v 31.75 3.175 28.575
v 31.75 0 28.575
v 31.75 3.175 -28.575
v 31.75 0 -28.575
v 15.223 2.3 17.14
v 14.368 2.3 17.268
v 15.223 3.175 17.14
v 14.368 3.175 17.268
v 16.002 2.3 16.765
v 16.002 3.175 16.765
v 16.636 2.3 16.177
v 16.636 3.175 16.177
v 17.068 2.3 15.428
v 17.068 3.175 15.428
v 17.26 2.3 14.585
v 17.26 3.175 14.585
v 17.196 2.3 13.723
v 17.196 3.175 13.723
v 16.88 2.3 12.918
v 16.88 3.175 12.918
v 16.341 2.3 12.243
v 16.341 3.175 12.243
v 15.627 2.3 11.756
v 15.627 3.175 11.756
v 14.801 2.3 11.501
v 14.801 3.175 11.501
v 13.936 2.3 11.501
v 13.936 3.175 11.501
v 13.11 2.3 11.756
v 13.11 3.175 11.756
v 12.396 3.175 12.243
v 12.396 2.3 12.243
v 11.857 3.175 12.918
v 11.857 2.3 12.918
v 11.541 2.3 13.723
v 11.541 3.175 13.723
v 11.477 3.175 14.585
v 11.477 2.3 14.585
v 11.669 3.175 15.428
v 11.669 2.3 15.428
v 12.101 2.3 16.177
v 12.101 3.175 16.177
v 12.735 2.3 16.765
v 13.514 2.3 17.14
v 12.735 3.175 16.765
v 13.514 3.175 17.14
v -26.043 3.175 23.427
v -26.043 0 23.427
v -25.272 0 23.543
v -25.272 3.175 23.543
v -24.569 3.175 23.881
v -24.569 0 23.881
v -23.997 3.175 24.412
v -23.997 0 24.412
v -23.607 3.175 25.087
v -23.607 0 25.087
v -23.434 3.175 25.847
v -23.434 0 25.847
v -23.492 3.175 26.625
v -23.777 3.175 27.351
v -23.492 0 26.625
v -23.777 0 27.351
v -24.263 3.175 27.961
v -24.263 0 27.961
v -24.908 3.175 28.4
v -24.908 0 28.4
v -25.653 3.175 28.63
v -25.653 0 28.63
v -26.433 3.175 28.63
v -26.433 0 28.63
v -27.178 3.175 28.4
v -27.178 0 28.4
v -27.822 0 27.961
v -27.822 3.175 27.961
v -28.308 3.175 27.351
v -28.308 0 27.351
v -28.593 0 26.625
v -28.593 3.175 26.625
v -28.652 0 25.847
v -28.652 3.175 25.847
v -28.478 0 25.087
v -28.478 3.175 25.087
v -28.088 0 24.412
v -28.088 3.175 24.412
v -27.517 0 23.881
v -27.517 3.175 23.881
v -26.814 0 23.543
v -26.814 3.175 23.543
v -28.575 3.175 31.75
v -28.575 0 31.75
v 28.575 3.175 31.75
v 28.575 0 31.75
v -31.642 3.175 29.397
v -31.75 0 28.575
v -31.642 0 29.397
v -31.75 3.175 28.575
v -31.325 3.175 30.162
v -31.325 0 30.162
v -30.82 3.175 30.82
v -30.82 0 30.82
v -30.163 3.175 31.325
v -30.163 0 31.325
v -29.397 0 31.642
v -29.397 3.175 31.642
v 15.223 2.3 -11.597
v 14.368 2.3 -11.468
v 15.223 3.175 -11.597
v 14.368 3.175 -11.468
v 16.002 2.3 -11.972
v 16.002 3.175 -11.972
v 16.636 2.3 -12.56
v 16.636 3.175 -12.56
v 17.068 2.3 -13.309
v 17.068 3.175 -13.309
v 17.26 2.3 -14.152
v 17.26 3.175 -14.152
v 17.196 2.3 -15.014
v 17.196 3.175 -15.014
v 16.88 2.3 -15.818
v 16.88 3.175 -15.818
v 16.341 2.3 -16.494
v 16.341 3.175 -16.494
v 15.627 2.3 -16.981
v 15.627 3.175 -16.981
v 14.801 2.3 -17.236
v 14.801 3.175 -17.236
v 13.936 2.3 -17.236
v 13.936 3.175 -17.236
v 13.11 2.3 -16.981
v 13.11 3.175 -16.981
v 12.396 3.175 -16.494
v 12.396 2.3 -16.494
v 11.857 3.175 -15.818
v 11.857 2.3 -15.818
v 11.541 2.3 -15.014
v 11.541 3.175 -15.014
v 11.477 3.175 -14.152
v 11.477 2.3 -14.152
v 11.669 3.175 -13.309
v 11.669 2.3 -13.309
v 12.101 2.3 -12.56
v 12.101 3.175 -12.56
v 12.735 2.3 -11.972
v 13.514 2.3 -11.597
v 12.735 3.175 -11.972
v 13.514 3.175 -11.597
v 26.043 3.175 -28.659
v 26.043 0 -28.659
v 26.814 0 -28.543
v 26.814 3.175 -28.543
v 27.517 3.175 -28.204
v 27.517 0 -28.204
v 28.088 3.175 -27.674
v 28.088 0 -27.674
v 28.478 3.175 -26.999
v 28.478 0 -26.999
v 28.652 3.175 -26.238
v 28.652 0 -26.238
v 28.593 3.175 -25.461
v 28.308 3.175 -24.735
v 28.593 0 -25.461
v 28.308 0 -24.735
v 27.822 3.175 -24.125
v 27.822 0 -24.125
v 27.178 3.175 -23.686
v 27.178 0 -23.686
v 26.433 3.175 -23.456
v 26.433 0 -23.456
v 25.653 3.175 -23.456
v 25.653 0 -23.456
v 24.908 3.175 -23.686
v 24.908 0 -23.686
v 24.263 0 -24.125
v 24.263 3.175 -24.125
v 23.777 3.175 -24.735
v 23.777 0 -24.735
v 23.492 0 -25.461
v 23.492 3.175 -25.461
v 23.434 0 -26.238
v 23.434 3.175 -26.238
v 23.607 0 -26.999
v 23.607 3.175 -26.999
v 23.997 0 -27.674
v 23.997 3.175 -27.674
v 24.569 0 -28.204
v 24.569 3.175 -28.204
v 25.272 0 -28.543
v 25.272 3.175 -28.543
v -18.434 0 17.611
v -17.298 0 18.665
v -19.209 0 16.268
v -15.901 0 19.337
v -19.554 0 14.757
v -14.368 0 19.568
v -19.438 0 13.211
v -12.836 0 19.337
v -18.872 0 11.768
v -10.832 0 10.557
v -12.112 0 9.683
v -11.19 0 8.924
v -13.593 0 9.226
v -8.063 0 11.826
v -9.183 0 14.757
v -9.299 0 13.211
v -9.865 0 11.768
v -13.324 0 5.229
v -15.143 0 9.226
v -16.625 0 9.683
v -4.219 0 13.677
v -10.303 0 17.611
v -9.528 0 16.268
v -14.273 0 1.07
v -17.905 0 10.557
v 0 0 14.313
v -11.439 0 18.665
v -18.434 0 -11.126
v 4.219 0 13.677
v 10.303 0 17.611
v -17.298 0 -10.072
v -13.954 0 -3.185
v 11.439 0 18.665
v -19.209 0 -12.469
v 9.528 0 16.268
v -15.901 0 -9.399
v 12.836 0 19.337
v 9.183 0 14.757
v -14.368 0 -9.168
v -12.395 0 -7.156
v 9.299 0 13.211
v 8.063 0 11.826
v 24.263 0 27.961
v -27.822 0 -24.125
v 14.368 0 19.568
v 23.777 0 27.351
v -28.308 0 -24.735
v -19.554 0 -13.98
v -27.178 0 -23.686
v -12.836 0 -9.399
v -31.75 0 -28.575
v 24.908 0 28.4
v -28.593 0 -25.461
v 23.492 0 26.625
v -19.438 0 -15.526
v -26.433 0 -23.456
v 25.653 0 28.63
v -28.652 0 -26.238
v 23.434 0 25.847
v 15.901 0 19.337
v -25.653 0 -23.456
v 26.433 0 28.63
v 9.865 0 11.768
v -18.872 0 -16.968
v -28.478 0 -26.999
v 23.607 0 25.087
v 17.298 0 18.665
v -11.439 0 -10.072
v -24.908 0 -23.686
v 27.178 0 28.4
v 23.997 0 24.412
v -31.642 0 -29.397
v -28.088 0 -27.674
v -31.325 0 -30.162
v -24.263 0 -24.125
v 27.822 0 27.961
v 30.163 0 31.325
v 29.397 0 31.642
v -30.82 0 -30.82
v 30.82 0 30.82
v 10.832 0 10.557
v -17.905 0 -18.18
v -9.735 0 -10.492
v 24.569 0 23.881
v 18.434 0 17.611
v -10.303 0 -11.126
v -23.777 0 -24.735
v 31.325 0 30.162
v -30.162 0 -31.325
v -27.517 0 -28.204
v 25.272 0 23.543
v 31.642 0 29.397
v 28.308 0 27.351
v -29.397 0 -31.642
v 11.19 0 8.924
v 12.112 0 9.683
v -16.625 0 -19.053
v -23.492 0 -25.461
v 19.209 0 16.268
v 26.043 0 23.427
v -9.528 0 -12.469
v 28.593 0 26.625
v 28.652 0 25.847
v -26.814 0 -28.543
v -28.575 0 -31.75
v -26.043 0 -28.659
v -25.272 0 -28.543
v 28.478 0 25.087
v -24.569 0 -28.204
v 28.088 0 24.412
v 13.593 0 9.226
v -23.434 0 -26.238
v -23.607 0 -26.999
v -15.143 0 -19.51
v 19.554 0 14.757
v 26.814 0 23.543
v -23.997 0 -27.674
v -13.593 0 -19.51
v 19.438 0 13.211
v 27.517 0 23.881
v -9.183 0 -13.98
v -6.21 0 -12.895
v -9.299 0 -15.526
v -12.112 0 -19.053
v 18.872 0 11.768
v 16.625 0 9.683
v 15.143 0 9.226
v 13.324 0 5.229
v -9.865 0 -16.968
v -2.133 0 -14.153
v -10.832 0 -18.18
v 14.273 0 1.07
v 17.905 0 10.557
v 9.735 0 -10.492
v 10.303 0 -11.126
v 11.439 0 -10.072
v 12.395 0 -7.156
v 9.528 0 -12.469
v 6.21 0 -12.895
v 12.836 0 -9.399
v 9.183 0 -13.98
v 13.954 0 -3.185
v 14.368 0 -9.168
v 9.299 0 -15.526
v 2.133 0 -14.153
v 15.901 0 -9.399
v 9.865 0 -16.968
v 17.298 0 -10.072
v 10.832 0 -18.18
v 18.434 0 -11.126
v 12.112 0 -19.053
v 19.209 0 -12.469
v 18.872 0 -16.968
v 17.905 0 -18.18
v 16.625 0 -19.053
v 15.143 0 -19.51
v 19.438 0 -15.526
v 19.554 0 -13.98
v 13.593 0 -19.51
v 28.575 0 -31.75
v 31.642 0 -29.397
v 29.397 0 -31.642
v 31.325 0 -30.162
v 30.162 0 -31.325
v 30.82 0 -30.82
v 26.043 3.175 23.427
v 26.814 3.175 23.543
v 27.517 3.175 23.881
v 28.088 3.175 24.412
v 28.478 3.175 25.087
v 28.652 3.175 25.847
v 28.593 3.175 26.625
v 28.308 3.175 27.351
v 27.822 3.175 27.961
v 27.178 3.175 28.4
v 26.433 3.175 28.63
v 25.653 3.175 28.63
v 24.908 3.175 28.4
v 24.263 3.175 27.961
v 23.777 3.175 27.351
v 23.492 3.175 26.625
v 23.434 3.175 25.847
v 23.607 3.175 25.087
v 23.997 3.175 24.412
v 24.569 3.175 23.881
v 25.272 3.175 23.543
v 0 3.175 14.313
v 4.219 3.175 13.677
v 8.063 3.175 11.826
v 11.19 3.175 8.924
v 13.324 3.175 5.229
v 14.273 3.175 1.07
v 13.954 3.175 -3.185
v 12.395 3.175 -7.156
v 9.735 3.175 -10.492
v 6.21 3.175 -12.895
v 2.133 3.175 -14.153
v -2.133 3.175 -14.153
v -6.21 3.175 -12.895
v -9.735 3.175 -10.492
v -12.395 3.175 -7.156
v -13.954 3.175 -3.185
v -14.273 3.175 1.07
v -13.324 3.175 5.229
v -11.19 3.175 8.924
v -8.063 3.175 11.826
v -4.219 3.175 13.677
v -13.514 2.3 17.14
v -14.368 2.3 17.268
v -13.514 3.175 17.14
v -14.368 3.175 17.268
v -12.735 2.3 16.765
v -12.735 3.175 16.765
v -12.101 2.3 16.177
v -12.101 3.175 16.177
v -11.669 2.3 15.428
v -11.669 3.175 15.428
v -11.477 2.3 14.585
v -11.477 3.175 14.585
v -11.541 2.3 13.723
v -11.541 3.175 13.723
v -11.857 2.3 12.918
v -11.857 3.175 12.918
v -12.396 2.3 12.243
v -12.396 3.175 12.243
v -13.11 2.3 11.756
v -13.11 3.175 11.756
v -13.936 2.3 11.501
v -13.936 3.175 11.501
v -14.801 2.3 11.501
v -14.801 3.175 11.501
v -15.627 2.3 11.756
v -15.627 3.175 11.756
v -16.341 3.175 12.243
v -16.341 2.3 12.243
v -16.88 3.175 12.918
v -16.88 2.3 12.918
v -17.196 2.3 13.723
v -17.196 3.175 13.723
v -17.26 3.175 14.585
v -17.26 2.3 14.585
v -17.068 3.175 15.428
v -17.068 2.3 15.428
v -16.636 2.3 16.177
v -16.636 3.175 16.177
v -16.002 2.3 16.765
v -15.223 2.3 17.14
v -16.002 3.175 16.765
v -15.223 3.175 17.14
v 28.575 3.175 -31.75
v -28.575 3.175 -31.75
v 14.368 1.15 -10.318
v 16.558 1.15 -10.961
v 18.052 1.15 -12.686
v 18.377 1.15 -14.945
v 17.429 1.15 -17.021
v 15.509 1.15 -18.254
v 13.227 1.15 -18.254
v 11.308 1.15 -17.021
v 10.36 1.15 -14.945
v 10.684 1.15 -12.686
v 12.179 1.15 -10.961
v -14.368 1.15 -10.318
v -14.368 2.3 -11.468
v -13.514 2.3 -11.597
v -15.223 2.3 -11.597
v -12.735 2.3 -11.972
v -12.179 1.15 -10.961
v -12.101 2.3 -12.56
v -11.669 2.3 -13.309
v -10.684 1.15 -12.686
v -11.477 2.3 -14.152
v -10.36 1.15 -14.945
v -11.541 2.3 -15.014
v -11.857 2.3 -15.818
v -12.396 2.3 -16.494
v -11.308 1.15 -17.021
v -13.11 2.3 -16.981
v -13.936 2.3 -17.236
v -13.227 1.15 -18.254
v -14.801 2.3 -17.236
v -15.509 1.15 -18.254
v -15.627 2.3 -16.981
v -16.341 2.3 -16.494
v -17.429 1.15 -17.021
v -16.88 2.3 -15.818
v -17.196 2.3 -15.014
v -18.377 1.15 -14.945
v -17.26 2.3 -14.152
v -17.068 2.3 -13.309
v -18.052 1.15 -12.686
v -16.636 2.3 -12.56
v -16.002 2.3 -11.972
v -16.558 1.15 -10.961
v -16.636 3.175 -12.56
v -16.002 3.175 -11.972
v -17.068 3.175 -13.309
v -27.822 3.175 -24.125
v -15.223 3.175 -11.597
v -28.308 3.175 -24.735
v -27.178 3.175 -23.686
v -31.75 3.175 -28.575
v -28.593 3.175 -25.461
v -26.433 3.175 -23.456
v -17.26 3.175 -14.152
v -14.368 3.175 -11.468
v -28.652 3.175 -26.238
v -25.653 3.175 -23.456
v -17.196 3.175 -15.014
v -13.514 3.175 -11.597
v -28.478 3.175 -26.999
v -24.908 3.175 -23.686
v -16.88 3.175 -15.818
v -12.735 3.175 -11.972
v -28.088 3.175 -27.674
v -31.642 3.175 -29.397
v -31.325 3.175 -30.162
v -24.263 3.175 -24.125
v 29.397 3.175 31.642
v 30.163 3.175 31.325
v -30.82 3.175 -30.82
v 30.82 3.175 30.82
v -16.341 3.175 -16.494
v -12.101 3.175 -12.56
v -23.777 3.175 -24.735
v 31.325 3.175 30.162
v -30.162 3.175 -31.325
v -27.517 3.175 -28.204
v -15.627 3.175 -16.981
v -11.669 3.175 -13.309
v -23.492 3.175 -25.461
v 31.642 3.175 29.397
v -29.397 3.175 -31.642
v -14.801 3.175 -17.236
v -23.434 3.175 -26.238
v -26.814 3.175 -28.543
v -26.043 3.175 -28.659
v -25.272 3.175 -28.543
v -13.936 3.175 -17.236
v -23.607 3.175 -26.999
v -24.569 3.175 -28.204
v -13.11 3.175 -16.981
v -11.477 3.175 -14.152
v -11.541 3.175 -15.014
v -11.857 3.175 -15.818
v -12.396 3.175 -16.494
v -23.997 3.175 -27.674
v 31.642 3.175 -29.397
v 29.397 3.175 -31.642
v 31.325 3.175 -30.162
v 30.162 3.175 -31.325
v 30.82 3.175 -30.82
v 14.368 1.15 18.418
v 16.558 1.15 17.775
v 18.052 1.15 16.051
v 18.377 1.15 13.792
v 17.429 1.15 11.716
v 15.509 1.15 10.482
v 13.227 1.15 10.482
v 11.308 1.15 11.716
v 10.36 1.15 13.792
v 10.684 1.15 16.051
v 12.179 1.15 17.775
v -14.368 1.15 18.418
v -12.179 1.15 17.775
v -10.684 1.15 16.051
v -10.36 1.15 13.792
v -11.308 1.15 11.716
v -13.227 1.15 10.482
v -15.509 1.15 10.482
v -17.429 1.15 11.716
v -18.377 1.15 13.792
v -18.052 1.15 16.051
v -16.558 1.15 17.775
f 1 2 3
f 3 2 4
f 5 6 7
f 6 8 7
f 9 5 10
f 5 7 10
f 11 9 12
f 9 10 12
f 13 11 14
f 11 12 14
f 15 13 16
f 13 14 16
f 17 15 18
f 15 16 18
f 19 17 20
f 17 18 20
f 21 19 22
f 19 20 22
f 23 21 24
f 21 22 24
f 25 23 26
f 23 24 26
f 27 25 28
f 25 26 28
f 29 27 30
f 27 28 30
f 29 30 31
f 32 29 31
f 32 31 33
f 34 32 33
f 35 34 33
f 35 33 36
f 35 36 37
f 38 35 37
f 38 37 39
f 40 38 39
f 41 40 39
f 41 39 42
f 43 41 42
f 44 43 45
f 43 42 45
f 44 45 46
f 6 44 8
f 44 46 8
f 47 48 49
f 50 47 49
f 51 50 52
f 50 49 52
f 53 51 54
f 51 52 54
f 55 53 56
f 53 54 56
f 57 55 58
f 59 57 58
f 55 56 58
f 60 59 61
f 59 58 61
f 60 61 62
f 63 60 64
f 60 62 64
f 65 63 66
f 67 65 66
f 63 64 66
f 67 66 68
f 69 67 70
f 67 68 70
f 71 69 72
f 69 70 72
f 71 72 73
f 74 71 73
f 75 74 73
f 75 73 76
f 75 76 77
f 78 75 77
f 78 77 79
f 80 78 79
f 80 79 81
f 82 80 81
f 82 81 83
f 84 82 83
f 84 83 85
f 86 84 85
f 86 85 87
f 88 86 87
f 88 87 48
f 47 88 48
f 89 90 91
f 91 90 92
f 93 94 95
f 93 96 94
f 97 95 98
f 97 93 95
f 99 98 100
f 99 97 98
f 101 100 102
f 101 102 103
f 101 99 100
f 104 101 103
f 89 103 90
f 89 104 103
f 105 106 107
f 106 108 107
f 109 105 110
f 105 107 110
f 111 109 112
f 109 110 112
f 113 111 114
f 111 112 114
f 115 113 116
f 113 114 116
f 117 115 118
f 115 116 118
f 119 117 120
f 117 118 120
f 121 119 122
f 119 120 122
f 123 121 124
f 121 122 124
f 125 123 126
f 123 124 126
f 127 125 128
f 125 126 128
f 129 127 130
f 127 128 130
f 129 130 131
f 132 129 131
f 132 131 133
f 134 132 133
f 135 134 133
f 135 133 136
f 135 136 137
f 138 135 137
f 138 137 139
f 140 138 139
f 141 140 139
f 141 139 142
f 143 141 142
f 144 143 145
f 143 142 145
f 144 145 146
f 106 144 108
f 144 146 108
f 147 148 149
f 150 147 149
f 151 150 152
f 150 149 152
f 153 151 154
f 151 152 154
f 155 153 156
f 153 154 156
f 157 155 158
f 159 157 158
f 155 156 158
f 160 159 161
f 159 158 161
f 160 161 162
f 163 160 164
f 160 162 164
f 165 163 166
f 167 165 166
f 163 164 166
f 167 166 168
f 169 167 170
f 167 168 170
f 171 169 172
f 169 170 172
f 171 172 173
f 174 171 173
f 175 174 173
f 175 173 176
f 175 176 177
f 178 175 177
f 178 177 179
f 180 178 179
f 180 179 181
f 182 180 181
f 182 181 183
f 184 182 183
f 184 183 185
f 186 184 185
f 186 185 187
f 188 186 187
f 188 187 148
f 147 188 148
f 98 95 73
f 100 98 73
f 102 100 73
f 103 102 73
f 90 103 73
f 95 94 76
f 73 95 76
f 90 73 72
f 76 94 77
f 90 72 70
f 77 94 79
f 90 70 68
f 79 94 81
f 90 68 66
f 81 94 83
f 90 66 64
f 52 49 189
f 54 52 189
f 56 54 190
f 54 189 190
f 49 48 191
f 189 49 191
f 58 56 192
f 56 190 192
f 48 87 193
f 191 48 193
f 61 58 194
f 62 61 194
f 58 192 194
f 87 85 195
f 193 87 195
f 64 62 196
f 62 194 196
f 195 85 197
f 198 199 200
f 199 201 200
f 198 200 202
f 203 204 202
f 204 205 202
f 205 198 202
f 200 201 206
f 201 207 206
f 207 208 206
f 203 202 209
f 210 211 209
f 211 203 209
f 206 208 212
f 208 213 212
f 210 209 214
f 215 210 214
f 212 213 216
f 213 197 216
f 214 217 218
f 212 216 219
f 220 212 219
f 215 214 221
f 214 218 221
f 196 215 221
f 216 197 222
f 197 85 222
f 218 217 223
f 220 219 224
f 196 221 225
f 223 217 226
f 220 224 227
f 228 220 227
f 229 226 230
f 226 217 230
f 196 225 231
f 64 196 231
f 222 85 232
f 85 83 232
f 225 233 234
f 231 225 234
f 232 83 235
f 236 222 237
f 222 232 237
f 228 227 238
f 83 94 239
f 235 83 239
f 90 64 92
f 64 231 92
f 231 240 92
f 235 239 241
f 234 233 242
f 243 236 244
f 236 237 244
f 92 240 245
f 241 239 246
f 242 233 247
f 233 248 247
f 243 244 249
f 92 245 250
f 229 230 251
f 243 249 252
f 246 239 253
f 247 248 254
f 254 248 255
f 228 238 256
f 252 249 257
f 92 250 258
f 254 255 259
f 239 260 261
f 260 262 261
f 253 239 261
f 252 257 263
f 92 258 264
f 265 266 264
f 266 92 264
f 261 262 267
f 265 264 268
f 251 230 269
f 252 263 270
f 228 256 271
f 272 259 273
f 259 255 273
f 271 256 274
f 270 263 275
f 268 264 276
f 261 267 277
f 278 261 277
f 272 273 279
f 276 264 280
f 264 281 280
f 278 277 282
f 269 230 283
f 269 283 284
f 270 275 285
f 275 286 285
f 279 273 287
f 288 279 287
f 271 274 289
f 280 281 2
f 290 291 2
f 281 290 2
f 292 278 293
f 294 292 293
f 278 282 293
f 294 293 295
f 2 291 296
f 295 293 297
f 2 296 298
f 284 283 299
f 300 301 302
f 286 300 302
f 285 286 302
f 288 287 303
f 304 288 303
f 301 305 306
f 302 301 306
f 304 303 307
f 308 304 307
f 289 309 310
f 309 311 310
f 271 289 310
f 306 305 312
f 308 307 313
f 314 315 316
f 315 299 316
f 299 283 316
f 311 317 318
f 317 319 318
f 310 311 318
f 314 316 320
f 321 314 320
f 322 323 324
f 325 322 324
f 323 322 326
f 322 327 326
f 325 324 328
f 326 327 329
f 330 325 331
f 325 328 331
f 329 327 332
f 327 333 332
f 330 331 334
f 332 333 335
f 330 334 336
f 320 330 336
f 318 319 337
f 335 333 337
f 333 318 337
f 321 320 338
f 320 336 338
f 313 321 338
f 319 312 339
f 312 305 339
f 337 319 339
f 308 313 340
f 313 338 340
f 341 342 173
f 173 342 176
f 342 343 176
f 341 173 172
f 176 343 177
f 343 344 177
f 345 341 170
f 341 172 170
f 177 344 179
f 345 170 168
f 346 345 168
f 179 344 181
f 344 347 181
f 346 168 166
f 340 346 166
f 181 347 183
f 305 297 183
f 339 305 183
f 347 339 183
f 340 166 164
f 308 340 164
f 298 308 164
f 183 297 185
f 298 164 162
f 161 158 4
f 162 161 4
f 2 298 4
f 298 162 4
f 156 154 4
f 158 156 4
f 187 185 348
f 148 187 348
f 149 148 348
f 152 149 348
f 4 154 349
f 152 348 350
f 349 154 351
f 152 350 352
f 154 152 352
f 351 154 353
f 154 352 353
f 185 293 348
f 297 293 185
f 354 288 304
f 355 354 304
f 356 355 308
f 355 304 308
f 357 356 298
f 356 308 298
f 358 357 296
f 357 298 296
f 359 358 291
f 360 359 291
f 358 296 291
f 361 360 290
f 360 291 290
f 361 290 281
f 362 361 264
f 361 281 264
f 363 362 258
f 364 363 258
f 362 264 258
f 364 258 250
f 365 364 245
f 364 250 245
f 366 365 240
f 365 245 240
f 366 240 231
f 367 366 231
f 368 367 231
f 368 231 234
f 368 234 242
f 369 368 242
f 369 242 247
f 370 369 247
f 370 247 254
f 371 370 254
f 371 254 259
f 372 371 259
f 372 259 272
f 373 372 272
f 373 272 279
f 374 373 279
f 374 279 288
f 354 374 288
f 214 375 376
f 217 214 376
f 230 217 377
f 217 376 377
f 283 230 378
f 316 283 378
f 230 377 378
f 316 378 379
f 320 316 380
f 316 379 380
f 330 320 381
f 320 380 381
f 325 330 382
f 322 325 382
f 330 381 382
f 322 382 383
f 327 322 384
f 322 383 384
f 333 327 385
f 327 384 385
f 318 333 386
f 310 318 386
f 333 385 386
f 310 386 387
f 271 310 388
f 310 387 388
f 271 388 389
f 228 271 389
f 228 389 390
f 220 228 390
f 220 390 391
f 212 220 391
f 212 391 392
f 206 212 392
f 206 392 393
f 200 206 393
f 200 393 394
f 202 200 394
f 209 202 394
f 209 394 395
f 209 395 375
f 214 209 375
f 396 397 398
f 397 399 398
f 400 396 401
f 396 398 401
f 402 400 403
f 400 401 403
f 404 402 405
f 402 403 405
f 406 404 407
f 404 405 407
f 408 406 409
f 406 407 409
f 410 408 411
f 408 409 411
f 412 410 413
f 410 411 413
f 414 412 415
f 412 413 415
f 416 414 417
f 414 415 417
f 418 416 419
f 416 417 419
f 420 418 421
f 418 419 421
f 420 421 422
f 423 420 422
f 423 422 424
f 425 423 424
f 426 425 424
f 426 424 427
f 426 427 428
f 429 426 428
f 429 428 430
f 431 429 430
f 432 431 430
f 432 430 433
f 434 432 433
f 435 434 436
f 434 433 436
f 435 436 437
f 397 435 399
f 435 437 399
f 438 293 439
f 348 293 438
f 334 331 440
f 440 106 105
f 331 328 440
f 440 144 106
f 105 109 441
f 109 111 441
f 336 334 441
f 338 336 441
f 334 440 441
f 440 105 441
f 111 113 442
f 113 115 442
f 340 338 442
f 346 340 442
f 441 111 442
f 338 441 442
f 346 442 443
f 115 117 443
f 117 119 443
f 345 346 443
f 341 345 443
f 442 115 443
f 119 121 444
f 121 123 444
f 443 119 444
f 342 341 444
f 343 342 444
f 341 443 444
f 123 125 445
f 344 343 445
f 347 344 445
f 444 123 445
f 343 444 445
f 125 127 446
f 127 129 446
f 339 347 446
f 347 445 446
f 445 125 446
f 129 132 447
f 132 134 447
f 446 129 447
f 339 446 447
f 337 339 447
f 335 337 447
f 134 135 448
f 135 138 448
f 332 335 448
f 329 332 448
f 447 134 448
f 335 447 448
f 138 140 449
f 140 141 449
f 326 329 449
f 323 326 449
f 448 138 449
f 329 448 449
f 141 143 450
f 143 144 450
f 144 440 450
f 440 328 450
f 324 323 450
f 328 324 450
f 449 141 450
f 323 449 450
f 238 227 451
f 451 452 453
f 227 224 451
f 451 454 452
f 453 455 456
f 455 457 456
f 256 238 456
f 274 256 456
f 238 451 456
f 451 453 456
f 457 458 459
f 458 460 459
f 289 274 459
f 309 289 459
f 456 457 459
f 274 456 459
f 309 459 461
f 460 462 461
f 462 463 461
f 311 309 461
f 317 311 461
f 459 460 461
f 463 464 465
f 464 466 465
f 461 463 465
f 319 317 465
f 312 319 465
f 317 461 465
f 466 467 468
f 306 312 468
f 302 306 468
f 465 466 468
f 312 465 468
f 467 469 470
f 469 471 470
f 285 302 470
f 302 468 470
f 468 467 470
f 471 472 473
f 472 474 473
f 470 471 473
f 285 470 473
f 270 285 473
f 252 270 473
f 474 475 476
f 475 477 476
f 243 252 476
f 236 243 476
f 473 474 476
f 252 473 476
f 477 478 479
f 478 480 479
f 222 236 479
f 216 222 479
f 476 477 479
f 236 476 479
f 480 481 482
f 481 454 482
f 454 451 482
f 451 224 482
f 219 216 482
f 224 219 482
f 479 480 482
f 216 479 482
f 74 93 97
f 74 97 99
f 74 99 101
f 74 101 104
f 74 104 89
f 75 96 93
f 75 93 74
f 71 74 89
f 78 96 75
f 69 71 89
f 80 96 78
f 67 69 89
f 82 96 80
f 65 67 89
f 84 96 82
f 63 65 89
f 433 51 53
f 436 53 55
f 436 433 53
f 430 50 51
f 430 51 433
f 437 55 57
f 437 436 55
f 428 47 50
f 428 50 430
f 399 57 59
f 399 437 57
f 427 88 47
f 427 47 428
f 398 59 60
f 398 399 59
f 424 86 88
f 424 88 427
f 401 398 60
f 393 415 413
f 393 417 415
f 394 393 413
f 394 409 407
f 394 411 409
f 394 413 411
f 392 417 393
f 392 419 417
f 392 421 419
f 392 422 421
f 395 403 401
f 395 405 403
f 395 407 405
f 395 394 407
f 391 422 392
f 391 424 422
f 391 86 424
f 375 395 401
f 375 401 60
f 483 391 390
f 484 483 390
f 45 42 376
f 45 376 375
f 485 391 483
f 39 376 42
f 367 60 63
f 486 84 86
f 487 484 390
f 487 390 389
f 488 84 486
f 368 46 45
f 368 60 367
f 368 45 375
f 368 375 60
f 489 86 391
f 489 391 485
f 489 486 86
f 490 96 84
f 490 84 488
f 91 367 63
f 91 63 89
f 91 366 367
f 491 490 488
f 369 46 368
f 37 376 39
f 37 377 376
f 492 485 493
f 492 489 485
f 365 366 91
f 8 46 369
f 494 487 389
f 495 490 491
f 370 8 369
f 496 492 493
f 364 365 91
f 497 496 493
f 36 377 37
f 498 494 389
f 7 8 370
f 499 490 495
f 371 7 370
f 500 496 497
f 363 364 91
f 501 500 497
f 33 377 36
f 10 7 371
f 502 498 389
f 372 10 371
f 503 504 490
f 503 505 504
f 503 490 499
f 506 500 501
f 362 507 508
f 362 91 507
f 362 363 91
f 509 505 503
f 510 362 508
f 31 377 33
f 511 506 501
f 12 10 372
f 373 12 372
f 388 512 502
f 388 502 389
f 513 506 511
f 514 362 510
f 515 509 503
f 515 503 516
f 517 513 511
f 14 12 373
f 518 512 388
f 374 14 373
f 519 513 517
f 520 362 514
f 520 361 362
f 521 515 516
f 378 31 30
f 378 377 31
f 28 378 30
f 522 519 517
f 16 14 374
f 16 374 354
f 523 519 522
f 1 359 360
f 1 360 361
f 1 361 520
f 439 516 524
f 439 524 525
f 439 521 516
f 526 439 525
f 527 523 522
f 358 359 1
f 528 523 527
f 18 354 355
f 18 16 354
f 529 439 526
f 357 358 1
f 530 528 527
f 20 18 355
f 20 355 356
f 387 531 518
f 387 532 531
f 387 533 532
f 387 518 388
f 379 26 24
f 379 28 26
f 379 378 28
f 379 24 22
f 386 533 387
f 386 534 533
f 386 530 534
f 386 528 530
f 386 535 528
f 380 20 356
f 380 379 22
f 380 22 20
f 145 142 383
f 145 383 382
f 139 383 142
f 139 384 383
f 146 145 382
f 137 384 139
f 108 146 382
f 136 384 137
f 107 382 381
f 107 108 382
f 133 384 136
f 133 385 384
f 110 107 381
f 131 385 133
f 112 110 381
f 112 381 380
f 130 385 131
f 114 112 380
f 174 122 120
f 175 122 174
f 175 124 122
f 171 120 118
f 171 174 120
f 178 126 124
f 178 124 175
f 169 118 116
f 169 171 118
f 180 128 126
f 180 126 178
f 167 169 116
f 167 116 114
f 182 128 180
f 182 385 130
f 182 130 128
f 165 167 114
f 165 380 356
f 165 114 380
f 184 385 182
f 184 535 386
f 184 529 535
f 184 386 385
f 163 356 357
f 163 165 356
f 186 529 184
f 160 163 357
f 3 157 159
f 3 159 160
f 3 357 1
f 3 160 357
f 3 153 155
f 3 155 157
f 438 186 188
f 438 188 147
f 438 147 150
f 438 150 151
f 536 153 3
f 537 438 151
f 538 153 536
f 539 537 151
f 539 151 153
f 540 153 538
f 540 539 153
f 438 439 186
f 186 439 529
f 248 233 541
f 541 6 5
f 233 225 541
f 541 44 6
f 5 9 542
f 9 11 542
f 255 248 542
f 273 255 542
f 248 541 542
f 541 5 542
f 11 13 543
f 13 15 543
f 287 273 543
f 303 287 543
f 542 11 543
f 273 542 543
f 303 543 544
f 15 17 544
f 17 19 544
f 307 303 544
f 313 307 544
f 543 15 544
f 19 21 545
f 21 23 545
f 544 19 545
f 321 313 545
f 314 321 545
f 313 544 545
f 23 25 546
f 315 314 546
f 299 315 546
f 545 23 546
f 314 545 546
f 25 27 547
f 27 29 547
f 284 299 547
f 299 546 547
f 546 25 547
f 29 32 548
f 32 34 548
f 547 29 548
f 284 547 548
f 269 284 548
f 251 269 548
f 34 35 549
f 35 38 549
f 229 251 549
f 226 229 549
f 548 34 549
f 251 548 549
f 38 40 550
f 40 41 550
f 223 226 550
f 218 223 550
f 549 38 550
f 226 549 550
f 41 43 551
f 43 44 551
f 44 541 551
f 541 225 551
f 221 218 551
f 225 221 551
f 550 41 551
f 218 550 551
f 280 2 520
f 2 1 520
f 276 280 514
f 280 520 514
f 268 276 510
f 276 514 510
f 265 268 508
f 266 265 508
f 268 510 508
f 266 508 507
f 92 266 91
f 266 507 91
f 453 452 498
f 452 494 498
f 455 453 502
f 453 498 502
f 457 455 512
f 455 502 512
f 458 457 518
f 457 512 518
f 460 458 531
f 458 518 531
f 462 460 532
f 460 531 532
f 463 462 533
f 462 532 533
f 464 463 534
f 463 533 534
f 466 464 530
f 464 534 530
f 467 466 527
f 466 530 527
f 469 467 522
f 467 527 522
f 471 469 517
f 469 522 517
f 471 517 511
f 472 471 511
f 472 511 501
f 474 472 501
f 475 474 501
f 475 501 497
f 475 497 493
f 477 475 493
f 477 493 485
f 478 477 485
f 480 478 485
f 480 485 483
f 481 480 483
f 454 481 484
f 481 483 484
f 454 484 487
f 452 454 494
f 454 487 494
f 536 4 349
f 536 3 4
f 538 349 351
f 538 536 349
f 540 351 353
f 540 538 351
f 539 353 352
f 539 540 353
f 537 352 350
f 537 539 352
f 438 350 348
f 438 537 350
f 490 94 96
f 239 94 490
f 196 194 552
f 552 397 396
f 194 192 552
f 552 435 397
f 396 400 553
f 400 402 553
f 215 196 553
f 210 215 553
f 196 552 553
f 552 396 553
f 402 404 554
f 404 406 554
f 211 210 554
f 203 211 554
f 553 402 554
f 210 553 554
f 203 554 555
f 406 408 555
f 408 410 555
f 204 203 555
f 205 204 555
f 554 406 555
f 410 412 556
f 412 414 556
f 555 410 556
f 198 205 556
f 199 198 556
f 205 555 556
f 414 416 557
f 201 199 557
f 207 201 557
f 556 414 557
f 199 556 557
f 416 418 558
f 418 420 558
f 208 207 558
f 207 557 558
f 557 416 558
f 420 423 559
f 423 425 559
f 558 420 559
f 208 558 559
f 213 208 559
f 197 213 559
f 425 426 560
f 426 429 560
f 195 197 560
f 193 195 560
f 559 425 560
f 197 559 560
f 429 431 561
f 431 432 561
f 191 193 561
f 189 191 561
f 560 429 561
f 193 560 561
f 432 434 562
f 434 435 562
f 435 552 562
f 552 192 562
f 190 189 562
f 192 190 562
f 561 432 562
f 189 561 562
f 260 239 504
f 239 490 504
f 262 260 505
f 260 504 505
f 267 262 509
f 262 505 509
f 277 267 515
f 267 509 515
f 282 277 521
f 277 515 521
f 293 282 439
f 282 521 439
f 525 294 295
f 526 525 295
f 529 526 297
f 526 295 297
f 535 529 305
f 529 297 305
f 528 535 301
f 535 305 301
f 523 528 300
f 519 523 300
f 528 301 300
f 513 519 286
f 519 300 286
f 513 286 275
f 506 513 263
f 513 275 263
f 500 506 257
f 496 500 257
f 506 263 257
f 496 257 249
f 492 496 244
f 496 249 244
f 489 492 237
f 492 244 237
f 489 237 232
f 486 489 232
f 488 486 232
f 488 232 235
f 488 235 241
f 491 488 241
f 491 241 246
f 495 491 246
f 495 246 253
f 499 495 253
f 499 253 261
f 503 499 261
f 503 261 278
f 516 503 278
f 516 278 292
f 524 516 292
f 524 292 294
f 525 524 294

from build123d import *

# Parameters (mm, degrees)
SKETCH1_W                                       = 63.5
SKETCH1_H                                       = 63.5
BOSS_EXTRUDE1_DEPTH                             = 3.175
CUT_EXTRUDE1_REACH                              = 47.013
SKETCH2_R                                       = 14.3129
CSK_FOR_M5_FLAT_HEAD_MACHINE_SCREW1_D           = 5.8
CSK_FOR_M5_FLAT_HEAD_MACHINE_SCREW1_DEPTH       = 6.35
CSK_FOR_M5_FLAT_HEAD_MACHINE_SCREW1_CSINK_D     = 10.4
CSK_FOR_M5_FLAT_HEAD_MACHINE_SCREW1_CSINK_ANGLE = 90
CSK_FOR_M5_FLAT_HEAD_MACHINE_SCREW1_TIP         = 1.742495795
FILLET1_R                                       = 3.175
CUT_EXTRUDE2_REACH                              = 47.013
SKETCH5_R                                       = 2.6162


with BuildPart() as part:
    # Sketch1 → Boss-Extrude1 (new body)
    with BuildSketch(Plane(origin=(0, 0, 0), x_dir=(1, 0, 0), z_dir=(0, 1, 0))):
        Rectangle(SKETCH1_W, SKETCH1_H)
    extrude(amount=BOSS_EXTRUDE1_DEPTH)

    # Sketch2 → Cut-Extrude1 (cut, up to next)
    with BuildSketch(Plane(origin=(0, 3.175, 0), x_dir=(1, 0, 0), z_dir=(0, 1, 0)), mode=Mode.PRIVATE) as cut_extrude1_sk1:
        with Locations(Location((0, 0, 0), (0, 0, 270))):
            Circle(SKETCH2_R)
    cut_extrude1_tool1 = extrude(cut_extrude1_sk1.sketch, amount=-CUT_EXTRUDE1_REACH, mode=Mode.PRIVATE) & part.part
    add(cut_extrude1_tool1.solids().sort_by_distance((0, 3.175, 0))[0], mode=Mode.SUBTRACT)

    # CSK for M5 Flat Head Machine Screw1
    with Locations(Plane(origin=(-14.368409794, 0, 14.368409794), x_dir=(0, 0, -1), z_dir=(0, -1, 0))):
        with Locations((0, 0), (0, 28.736819588), (28.736819588, 28.736819588), (28.736819588, 0)):
            CounterSinkHole(CSK_FOR_M5_FLAT_HEAD_MACHINE_SCREW1_D / 2, CSK_FOR_M5_FLAT_HEAD_MACHINE_SCREW1_CSINK_D / 2, depth=CSK_FOR_M5_FLAT_HEAD_MACHINE_SCREW1_DEPTH, counter_sink_angle=CSK_FOR_M5_FLAT_HEAD_MACHINE_SCREW1_CSINK_ANGLE)
            with Locations((0, 0, -(CSK_FOR_M5_FLAT_HEAD_MACHINE_SCREW1_DEPTH + CSK_FOR_M5_FLAT_HEAD_MACHINE_SCREW1_TIP / 2))):  # 118° drill point
                Cone(0, CSK_FOR_M5_FLAT_HEAD_MACHINE_SCREW1_D / 2, CSK_FOR_M5_FLAT_HEAD_MACHINE_SCREW1_TIP, mode=Mode.SUBTRACT)

    # Fillet1
    fillet1_edges = [part.edges().sort_by_distance(p)[0] for p in [
        (-31.75, 1.5875, -31.75),
        (31.75, 1.5875, -31.75),
        (31.75, 1.5875, 31.75),
        (-31.75, 1.5875, 31.75),
    ]]
    fillet(fillet1_edges, radius=FILLET1_R)

    # Sketch5 → Cut-Extrude2 (cut, up to next)
    with BuildSketch(Plane(origin=(0, 0, 0), x_dir=(-1, 0, 0), z_dir=(0, -1, 0)), mode=Mode.PRIVATE) as cut_extrude2_sk1:
        with Locations(Location((-26.042742751, -26.042742751, 0), (0, 0, 90))):
            Circle(SKETCH5_R)
    cut_extrude2_tool1 = extrude(cut_extrude2_sk1.sketch, amount=-CUT_EXTRUDE2_REACH, mode=Mode.PRIVATE) & part.part
    # Sketch5 → Cut-Extrude2 (cut, up to next)
    with BuildSketch(Plane(origin=(0, 0, 0), x_dir=(-1, 0, 0), z_dir=(0, -1, 0)), mode=Mode.PRIVATE) as cut_extrude2_sk2:
        with Locations(Location((-26.042742751, 26.042742751, 0), (0, 0, 90))):
            Circle(SKETCH5_R)
    cut_extrude2_tool2 = extrude(cut_extrude2_sk2.sketch, amount=-CUT_EXTRUDE2_REACH, mode=Mode.PRIVATE) & part.part
    # Sketch5 → Cut-Extrude2 (cut, up to next)
    with BuildSketch(Plane(origin=(0, 0, 0), x_dir=(-1, 0, 0), z_dir=(0, -1, 0)), mode=Mode.PRIVATE) as cut_extrude2_sk3:
        with Locations(Location((26.042742751, 26.042742751, 0), (0, 0, 90))):
            Circle(SKETCH5_R)
    cut_extrude2_tool3 = extrude(cut_extrude2_sk3.sketch, amount=-CUT_EXTRUDE2_REACH, mode=Mode.PRIVATE) & part.part
    # Sketch5 → Cut-Extrude2 (cut, up to next)
    with BuildSketch(Plane(origin=(0, 0, 0), x_dir=(-1, 0, 0), z_dir=(0, -1, 0)), mode=Mode.PRIVATE) as cut_extrude2_sk4:
        with Locations(Location((26.042742751, -26.042742751, 0), (0, 0, 90))):
            Circle(SKETCH5_R)
    cut_extrude2_tool4 = extrude(cut_extrude2_sk4.sketch, amount=-CUT_EXTRUDE2_REACH, mode=Mode.PRIVATE) & part.part
    add(cut_extrude2_tool1.solids().sort_by_distance((26.042743, 0, 26.042743))[0], mode=Mode.SUBTRACT)
    add(cut_extrude2_tool2.solids().sort_by_distance((26.042743, 0, -26.042743))[0], mode=Mode.SUBTRACT)
    add(cut_extrude2_tool3.solids().sort_by_distance((-26.042743, 0, -26.042743))[0], mode=Mode.SUBTRACT)
    add(cut_extrude2_tool4.solids().sort_by_distance((-26.042743, 0, 26.042743))[0], mode=Mode.SUBTRACT)


solid = part.part
